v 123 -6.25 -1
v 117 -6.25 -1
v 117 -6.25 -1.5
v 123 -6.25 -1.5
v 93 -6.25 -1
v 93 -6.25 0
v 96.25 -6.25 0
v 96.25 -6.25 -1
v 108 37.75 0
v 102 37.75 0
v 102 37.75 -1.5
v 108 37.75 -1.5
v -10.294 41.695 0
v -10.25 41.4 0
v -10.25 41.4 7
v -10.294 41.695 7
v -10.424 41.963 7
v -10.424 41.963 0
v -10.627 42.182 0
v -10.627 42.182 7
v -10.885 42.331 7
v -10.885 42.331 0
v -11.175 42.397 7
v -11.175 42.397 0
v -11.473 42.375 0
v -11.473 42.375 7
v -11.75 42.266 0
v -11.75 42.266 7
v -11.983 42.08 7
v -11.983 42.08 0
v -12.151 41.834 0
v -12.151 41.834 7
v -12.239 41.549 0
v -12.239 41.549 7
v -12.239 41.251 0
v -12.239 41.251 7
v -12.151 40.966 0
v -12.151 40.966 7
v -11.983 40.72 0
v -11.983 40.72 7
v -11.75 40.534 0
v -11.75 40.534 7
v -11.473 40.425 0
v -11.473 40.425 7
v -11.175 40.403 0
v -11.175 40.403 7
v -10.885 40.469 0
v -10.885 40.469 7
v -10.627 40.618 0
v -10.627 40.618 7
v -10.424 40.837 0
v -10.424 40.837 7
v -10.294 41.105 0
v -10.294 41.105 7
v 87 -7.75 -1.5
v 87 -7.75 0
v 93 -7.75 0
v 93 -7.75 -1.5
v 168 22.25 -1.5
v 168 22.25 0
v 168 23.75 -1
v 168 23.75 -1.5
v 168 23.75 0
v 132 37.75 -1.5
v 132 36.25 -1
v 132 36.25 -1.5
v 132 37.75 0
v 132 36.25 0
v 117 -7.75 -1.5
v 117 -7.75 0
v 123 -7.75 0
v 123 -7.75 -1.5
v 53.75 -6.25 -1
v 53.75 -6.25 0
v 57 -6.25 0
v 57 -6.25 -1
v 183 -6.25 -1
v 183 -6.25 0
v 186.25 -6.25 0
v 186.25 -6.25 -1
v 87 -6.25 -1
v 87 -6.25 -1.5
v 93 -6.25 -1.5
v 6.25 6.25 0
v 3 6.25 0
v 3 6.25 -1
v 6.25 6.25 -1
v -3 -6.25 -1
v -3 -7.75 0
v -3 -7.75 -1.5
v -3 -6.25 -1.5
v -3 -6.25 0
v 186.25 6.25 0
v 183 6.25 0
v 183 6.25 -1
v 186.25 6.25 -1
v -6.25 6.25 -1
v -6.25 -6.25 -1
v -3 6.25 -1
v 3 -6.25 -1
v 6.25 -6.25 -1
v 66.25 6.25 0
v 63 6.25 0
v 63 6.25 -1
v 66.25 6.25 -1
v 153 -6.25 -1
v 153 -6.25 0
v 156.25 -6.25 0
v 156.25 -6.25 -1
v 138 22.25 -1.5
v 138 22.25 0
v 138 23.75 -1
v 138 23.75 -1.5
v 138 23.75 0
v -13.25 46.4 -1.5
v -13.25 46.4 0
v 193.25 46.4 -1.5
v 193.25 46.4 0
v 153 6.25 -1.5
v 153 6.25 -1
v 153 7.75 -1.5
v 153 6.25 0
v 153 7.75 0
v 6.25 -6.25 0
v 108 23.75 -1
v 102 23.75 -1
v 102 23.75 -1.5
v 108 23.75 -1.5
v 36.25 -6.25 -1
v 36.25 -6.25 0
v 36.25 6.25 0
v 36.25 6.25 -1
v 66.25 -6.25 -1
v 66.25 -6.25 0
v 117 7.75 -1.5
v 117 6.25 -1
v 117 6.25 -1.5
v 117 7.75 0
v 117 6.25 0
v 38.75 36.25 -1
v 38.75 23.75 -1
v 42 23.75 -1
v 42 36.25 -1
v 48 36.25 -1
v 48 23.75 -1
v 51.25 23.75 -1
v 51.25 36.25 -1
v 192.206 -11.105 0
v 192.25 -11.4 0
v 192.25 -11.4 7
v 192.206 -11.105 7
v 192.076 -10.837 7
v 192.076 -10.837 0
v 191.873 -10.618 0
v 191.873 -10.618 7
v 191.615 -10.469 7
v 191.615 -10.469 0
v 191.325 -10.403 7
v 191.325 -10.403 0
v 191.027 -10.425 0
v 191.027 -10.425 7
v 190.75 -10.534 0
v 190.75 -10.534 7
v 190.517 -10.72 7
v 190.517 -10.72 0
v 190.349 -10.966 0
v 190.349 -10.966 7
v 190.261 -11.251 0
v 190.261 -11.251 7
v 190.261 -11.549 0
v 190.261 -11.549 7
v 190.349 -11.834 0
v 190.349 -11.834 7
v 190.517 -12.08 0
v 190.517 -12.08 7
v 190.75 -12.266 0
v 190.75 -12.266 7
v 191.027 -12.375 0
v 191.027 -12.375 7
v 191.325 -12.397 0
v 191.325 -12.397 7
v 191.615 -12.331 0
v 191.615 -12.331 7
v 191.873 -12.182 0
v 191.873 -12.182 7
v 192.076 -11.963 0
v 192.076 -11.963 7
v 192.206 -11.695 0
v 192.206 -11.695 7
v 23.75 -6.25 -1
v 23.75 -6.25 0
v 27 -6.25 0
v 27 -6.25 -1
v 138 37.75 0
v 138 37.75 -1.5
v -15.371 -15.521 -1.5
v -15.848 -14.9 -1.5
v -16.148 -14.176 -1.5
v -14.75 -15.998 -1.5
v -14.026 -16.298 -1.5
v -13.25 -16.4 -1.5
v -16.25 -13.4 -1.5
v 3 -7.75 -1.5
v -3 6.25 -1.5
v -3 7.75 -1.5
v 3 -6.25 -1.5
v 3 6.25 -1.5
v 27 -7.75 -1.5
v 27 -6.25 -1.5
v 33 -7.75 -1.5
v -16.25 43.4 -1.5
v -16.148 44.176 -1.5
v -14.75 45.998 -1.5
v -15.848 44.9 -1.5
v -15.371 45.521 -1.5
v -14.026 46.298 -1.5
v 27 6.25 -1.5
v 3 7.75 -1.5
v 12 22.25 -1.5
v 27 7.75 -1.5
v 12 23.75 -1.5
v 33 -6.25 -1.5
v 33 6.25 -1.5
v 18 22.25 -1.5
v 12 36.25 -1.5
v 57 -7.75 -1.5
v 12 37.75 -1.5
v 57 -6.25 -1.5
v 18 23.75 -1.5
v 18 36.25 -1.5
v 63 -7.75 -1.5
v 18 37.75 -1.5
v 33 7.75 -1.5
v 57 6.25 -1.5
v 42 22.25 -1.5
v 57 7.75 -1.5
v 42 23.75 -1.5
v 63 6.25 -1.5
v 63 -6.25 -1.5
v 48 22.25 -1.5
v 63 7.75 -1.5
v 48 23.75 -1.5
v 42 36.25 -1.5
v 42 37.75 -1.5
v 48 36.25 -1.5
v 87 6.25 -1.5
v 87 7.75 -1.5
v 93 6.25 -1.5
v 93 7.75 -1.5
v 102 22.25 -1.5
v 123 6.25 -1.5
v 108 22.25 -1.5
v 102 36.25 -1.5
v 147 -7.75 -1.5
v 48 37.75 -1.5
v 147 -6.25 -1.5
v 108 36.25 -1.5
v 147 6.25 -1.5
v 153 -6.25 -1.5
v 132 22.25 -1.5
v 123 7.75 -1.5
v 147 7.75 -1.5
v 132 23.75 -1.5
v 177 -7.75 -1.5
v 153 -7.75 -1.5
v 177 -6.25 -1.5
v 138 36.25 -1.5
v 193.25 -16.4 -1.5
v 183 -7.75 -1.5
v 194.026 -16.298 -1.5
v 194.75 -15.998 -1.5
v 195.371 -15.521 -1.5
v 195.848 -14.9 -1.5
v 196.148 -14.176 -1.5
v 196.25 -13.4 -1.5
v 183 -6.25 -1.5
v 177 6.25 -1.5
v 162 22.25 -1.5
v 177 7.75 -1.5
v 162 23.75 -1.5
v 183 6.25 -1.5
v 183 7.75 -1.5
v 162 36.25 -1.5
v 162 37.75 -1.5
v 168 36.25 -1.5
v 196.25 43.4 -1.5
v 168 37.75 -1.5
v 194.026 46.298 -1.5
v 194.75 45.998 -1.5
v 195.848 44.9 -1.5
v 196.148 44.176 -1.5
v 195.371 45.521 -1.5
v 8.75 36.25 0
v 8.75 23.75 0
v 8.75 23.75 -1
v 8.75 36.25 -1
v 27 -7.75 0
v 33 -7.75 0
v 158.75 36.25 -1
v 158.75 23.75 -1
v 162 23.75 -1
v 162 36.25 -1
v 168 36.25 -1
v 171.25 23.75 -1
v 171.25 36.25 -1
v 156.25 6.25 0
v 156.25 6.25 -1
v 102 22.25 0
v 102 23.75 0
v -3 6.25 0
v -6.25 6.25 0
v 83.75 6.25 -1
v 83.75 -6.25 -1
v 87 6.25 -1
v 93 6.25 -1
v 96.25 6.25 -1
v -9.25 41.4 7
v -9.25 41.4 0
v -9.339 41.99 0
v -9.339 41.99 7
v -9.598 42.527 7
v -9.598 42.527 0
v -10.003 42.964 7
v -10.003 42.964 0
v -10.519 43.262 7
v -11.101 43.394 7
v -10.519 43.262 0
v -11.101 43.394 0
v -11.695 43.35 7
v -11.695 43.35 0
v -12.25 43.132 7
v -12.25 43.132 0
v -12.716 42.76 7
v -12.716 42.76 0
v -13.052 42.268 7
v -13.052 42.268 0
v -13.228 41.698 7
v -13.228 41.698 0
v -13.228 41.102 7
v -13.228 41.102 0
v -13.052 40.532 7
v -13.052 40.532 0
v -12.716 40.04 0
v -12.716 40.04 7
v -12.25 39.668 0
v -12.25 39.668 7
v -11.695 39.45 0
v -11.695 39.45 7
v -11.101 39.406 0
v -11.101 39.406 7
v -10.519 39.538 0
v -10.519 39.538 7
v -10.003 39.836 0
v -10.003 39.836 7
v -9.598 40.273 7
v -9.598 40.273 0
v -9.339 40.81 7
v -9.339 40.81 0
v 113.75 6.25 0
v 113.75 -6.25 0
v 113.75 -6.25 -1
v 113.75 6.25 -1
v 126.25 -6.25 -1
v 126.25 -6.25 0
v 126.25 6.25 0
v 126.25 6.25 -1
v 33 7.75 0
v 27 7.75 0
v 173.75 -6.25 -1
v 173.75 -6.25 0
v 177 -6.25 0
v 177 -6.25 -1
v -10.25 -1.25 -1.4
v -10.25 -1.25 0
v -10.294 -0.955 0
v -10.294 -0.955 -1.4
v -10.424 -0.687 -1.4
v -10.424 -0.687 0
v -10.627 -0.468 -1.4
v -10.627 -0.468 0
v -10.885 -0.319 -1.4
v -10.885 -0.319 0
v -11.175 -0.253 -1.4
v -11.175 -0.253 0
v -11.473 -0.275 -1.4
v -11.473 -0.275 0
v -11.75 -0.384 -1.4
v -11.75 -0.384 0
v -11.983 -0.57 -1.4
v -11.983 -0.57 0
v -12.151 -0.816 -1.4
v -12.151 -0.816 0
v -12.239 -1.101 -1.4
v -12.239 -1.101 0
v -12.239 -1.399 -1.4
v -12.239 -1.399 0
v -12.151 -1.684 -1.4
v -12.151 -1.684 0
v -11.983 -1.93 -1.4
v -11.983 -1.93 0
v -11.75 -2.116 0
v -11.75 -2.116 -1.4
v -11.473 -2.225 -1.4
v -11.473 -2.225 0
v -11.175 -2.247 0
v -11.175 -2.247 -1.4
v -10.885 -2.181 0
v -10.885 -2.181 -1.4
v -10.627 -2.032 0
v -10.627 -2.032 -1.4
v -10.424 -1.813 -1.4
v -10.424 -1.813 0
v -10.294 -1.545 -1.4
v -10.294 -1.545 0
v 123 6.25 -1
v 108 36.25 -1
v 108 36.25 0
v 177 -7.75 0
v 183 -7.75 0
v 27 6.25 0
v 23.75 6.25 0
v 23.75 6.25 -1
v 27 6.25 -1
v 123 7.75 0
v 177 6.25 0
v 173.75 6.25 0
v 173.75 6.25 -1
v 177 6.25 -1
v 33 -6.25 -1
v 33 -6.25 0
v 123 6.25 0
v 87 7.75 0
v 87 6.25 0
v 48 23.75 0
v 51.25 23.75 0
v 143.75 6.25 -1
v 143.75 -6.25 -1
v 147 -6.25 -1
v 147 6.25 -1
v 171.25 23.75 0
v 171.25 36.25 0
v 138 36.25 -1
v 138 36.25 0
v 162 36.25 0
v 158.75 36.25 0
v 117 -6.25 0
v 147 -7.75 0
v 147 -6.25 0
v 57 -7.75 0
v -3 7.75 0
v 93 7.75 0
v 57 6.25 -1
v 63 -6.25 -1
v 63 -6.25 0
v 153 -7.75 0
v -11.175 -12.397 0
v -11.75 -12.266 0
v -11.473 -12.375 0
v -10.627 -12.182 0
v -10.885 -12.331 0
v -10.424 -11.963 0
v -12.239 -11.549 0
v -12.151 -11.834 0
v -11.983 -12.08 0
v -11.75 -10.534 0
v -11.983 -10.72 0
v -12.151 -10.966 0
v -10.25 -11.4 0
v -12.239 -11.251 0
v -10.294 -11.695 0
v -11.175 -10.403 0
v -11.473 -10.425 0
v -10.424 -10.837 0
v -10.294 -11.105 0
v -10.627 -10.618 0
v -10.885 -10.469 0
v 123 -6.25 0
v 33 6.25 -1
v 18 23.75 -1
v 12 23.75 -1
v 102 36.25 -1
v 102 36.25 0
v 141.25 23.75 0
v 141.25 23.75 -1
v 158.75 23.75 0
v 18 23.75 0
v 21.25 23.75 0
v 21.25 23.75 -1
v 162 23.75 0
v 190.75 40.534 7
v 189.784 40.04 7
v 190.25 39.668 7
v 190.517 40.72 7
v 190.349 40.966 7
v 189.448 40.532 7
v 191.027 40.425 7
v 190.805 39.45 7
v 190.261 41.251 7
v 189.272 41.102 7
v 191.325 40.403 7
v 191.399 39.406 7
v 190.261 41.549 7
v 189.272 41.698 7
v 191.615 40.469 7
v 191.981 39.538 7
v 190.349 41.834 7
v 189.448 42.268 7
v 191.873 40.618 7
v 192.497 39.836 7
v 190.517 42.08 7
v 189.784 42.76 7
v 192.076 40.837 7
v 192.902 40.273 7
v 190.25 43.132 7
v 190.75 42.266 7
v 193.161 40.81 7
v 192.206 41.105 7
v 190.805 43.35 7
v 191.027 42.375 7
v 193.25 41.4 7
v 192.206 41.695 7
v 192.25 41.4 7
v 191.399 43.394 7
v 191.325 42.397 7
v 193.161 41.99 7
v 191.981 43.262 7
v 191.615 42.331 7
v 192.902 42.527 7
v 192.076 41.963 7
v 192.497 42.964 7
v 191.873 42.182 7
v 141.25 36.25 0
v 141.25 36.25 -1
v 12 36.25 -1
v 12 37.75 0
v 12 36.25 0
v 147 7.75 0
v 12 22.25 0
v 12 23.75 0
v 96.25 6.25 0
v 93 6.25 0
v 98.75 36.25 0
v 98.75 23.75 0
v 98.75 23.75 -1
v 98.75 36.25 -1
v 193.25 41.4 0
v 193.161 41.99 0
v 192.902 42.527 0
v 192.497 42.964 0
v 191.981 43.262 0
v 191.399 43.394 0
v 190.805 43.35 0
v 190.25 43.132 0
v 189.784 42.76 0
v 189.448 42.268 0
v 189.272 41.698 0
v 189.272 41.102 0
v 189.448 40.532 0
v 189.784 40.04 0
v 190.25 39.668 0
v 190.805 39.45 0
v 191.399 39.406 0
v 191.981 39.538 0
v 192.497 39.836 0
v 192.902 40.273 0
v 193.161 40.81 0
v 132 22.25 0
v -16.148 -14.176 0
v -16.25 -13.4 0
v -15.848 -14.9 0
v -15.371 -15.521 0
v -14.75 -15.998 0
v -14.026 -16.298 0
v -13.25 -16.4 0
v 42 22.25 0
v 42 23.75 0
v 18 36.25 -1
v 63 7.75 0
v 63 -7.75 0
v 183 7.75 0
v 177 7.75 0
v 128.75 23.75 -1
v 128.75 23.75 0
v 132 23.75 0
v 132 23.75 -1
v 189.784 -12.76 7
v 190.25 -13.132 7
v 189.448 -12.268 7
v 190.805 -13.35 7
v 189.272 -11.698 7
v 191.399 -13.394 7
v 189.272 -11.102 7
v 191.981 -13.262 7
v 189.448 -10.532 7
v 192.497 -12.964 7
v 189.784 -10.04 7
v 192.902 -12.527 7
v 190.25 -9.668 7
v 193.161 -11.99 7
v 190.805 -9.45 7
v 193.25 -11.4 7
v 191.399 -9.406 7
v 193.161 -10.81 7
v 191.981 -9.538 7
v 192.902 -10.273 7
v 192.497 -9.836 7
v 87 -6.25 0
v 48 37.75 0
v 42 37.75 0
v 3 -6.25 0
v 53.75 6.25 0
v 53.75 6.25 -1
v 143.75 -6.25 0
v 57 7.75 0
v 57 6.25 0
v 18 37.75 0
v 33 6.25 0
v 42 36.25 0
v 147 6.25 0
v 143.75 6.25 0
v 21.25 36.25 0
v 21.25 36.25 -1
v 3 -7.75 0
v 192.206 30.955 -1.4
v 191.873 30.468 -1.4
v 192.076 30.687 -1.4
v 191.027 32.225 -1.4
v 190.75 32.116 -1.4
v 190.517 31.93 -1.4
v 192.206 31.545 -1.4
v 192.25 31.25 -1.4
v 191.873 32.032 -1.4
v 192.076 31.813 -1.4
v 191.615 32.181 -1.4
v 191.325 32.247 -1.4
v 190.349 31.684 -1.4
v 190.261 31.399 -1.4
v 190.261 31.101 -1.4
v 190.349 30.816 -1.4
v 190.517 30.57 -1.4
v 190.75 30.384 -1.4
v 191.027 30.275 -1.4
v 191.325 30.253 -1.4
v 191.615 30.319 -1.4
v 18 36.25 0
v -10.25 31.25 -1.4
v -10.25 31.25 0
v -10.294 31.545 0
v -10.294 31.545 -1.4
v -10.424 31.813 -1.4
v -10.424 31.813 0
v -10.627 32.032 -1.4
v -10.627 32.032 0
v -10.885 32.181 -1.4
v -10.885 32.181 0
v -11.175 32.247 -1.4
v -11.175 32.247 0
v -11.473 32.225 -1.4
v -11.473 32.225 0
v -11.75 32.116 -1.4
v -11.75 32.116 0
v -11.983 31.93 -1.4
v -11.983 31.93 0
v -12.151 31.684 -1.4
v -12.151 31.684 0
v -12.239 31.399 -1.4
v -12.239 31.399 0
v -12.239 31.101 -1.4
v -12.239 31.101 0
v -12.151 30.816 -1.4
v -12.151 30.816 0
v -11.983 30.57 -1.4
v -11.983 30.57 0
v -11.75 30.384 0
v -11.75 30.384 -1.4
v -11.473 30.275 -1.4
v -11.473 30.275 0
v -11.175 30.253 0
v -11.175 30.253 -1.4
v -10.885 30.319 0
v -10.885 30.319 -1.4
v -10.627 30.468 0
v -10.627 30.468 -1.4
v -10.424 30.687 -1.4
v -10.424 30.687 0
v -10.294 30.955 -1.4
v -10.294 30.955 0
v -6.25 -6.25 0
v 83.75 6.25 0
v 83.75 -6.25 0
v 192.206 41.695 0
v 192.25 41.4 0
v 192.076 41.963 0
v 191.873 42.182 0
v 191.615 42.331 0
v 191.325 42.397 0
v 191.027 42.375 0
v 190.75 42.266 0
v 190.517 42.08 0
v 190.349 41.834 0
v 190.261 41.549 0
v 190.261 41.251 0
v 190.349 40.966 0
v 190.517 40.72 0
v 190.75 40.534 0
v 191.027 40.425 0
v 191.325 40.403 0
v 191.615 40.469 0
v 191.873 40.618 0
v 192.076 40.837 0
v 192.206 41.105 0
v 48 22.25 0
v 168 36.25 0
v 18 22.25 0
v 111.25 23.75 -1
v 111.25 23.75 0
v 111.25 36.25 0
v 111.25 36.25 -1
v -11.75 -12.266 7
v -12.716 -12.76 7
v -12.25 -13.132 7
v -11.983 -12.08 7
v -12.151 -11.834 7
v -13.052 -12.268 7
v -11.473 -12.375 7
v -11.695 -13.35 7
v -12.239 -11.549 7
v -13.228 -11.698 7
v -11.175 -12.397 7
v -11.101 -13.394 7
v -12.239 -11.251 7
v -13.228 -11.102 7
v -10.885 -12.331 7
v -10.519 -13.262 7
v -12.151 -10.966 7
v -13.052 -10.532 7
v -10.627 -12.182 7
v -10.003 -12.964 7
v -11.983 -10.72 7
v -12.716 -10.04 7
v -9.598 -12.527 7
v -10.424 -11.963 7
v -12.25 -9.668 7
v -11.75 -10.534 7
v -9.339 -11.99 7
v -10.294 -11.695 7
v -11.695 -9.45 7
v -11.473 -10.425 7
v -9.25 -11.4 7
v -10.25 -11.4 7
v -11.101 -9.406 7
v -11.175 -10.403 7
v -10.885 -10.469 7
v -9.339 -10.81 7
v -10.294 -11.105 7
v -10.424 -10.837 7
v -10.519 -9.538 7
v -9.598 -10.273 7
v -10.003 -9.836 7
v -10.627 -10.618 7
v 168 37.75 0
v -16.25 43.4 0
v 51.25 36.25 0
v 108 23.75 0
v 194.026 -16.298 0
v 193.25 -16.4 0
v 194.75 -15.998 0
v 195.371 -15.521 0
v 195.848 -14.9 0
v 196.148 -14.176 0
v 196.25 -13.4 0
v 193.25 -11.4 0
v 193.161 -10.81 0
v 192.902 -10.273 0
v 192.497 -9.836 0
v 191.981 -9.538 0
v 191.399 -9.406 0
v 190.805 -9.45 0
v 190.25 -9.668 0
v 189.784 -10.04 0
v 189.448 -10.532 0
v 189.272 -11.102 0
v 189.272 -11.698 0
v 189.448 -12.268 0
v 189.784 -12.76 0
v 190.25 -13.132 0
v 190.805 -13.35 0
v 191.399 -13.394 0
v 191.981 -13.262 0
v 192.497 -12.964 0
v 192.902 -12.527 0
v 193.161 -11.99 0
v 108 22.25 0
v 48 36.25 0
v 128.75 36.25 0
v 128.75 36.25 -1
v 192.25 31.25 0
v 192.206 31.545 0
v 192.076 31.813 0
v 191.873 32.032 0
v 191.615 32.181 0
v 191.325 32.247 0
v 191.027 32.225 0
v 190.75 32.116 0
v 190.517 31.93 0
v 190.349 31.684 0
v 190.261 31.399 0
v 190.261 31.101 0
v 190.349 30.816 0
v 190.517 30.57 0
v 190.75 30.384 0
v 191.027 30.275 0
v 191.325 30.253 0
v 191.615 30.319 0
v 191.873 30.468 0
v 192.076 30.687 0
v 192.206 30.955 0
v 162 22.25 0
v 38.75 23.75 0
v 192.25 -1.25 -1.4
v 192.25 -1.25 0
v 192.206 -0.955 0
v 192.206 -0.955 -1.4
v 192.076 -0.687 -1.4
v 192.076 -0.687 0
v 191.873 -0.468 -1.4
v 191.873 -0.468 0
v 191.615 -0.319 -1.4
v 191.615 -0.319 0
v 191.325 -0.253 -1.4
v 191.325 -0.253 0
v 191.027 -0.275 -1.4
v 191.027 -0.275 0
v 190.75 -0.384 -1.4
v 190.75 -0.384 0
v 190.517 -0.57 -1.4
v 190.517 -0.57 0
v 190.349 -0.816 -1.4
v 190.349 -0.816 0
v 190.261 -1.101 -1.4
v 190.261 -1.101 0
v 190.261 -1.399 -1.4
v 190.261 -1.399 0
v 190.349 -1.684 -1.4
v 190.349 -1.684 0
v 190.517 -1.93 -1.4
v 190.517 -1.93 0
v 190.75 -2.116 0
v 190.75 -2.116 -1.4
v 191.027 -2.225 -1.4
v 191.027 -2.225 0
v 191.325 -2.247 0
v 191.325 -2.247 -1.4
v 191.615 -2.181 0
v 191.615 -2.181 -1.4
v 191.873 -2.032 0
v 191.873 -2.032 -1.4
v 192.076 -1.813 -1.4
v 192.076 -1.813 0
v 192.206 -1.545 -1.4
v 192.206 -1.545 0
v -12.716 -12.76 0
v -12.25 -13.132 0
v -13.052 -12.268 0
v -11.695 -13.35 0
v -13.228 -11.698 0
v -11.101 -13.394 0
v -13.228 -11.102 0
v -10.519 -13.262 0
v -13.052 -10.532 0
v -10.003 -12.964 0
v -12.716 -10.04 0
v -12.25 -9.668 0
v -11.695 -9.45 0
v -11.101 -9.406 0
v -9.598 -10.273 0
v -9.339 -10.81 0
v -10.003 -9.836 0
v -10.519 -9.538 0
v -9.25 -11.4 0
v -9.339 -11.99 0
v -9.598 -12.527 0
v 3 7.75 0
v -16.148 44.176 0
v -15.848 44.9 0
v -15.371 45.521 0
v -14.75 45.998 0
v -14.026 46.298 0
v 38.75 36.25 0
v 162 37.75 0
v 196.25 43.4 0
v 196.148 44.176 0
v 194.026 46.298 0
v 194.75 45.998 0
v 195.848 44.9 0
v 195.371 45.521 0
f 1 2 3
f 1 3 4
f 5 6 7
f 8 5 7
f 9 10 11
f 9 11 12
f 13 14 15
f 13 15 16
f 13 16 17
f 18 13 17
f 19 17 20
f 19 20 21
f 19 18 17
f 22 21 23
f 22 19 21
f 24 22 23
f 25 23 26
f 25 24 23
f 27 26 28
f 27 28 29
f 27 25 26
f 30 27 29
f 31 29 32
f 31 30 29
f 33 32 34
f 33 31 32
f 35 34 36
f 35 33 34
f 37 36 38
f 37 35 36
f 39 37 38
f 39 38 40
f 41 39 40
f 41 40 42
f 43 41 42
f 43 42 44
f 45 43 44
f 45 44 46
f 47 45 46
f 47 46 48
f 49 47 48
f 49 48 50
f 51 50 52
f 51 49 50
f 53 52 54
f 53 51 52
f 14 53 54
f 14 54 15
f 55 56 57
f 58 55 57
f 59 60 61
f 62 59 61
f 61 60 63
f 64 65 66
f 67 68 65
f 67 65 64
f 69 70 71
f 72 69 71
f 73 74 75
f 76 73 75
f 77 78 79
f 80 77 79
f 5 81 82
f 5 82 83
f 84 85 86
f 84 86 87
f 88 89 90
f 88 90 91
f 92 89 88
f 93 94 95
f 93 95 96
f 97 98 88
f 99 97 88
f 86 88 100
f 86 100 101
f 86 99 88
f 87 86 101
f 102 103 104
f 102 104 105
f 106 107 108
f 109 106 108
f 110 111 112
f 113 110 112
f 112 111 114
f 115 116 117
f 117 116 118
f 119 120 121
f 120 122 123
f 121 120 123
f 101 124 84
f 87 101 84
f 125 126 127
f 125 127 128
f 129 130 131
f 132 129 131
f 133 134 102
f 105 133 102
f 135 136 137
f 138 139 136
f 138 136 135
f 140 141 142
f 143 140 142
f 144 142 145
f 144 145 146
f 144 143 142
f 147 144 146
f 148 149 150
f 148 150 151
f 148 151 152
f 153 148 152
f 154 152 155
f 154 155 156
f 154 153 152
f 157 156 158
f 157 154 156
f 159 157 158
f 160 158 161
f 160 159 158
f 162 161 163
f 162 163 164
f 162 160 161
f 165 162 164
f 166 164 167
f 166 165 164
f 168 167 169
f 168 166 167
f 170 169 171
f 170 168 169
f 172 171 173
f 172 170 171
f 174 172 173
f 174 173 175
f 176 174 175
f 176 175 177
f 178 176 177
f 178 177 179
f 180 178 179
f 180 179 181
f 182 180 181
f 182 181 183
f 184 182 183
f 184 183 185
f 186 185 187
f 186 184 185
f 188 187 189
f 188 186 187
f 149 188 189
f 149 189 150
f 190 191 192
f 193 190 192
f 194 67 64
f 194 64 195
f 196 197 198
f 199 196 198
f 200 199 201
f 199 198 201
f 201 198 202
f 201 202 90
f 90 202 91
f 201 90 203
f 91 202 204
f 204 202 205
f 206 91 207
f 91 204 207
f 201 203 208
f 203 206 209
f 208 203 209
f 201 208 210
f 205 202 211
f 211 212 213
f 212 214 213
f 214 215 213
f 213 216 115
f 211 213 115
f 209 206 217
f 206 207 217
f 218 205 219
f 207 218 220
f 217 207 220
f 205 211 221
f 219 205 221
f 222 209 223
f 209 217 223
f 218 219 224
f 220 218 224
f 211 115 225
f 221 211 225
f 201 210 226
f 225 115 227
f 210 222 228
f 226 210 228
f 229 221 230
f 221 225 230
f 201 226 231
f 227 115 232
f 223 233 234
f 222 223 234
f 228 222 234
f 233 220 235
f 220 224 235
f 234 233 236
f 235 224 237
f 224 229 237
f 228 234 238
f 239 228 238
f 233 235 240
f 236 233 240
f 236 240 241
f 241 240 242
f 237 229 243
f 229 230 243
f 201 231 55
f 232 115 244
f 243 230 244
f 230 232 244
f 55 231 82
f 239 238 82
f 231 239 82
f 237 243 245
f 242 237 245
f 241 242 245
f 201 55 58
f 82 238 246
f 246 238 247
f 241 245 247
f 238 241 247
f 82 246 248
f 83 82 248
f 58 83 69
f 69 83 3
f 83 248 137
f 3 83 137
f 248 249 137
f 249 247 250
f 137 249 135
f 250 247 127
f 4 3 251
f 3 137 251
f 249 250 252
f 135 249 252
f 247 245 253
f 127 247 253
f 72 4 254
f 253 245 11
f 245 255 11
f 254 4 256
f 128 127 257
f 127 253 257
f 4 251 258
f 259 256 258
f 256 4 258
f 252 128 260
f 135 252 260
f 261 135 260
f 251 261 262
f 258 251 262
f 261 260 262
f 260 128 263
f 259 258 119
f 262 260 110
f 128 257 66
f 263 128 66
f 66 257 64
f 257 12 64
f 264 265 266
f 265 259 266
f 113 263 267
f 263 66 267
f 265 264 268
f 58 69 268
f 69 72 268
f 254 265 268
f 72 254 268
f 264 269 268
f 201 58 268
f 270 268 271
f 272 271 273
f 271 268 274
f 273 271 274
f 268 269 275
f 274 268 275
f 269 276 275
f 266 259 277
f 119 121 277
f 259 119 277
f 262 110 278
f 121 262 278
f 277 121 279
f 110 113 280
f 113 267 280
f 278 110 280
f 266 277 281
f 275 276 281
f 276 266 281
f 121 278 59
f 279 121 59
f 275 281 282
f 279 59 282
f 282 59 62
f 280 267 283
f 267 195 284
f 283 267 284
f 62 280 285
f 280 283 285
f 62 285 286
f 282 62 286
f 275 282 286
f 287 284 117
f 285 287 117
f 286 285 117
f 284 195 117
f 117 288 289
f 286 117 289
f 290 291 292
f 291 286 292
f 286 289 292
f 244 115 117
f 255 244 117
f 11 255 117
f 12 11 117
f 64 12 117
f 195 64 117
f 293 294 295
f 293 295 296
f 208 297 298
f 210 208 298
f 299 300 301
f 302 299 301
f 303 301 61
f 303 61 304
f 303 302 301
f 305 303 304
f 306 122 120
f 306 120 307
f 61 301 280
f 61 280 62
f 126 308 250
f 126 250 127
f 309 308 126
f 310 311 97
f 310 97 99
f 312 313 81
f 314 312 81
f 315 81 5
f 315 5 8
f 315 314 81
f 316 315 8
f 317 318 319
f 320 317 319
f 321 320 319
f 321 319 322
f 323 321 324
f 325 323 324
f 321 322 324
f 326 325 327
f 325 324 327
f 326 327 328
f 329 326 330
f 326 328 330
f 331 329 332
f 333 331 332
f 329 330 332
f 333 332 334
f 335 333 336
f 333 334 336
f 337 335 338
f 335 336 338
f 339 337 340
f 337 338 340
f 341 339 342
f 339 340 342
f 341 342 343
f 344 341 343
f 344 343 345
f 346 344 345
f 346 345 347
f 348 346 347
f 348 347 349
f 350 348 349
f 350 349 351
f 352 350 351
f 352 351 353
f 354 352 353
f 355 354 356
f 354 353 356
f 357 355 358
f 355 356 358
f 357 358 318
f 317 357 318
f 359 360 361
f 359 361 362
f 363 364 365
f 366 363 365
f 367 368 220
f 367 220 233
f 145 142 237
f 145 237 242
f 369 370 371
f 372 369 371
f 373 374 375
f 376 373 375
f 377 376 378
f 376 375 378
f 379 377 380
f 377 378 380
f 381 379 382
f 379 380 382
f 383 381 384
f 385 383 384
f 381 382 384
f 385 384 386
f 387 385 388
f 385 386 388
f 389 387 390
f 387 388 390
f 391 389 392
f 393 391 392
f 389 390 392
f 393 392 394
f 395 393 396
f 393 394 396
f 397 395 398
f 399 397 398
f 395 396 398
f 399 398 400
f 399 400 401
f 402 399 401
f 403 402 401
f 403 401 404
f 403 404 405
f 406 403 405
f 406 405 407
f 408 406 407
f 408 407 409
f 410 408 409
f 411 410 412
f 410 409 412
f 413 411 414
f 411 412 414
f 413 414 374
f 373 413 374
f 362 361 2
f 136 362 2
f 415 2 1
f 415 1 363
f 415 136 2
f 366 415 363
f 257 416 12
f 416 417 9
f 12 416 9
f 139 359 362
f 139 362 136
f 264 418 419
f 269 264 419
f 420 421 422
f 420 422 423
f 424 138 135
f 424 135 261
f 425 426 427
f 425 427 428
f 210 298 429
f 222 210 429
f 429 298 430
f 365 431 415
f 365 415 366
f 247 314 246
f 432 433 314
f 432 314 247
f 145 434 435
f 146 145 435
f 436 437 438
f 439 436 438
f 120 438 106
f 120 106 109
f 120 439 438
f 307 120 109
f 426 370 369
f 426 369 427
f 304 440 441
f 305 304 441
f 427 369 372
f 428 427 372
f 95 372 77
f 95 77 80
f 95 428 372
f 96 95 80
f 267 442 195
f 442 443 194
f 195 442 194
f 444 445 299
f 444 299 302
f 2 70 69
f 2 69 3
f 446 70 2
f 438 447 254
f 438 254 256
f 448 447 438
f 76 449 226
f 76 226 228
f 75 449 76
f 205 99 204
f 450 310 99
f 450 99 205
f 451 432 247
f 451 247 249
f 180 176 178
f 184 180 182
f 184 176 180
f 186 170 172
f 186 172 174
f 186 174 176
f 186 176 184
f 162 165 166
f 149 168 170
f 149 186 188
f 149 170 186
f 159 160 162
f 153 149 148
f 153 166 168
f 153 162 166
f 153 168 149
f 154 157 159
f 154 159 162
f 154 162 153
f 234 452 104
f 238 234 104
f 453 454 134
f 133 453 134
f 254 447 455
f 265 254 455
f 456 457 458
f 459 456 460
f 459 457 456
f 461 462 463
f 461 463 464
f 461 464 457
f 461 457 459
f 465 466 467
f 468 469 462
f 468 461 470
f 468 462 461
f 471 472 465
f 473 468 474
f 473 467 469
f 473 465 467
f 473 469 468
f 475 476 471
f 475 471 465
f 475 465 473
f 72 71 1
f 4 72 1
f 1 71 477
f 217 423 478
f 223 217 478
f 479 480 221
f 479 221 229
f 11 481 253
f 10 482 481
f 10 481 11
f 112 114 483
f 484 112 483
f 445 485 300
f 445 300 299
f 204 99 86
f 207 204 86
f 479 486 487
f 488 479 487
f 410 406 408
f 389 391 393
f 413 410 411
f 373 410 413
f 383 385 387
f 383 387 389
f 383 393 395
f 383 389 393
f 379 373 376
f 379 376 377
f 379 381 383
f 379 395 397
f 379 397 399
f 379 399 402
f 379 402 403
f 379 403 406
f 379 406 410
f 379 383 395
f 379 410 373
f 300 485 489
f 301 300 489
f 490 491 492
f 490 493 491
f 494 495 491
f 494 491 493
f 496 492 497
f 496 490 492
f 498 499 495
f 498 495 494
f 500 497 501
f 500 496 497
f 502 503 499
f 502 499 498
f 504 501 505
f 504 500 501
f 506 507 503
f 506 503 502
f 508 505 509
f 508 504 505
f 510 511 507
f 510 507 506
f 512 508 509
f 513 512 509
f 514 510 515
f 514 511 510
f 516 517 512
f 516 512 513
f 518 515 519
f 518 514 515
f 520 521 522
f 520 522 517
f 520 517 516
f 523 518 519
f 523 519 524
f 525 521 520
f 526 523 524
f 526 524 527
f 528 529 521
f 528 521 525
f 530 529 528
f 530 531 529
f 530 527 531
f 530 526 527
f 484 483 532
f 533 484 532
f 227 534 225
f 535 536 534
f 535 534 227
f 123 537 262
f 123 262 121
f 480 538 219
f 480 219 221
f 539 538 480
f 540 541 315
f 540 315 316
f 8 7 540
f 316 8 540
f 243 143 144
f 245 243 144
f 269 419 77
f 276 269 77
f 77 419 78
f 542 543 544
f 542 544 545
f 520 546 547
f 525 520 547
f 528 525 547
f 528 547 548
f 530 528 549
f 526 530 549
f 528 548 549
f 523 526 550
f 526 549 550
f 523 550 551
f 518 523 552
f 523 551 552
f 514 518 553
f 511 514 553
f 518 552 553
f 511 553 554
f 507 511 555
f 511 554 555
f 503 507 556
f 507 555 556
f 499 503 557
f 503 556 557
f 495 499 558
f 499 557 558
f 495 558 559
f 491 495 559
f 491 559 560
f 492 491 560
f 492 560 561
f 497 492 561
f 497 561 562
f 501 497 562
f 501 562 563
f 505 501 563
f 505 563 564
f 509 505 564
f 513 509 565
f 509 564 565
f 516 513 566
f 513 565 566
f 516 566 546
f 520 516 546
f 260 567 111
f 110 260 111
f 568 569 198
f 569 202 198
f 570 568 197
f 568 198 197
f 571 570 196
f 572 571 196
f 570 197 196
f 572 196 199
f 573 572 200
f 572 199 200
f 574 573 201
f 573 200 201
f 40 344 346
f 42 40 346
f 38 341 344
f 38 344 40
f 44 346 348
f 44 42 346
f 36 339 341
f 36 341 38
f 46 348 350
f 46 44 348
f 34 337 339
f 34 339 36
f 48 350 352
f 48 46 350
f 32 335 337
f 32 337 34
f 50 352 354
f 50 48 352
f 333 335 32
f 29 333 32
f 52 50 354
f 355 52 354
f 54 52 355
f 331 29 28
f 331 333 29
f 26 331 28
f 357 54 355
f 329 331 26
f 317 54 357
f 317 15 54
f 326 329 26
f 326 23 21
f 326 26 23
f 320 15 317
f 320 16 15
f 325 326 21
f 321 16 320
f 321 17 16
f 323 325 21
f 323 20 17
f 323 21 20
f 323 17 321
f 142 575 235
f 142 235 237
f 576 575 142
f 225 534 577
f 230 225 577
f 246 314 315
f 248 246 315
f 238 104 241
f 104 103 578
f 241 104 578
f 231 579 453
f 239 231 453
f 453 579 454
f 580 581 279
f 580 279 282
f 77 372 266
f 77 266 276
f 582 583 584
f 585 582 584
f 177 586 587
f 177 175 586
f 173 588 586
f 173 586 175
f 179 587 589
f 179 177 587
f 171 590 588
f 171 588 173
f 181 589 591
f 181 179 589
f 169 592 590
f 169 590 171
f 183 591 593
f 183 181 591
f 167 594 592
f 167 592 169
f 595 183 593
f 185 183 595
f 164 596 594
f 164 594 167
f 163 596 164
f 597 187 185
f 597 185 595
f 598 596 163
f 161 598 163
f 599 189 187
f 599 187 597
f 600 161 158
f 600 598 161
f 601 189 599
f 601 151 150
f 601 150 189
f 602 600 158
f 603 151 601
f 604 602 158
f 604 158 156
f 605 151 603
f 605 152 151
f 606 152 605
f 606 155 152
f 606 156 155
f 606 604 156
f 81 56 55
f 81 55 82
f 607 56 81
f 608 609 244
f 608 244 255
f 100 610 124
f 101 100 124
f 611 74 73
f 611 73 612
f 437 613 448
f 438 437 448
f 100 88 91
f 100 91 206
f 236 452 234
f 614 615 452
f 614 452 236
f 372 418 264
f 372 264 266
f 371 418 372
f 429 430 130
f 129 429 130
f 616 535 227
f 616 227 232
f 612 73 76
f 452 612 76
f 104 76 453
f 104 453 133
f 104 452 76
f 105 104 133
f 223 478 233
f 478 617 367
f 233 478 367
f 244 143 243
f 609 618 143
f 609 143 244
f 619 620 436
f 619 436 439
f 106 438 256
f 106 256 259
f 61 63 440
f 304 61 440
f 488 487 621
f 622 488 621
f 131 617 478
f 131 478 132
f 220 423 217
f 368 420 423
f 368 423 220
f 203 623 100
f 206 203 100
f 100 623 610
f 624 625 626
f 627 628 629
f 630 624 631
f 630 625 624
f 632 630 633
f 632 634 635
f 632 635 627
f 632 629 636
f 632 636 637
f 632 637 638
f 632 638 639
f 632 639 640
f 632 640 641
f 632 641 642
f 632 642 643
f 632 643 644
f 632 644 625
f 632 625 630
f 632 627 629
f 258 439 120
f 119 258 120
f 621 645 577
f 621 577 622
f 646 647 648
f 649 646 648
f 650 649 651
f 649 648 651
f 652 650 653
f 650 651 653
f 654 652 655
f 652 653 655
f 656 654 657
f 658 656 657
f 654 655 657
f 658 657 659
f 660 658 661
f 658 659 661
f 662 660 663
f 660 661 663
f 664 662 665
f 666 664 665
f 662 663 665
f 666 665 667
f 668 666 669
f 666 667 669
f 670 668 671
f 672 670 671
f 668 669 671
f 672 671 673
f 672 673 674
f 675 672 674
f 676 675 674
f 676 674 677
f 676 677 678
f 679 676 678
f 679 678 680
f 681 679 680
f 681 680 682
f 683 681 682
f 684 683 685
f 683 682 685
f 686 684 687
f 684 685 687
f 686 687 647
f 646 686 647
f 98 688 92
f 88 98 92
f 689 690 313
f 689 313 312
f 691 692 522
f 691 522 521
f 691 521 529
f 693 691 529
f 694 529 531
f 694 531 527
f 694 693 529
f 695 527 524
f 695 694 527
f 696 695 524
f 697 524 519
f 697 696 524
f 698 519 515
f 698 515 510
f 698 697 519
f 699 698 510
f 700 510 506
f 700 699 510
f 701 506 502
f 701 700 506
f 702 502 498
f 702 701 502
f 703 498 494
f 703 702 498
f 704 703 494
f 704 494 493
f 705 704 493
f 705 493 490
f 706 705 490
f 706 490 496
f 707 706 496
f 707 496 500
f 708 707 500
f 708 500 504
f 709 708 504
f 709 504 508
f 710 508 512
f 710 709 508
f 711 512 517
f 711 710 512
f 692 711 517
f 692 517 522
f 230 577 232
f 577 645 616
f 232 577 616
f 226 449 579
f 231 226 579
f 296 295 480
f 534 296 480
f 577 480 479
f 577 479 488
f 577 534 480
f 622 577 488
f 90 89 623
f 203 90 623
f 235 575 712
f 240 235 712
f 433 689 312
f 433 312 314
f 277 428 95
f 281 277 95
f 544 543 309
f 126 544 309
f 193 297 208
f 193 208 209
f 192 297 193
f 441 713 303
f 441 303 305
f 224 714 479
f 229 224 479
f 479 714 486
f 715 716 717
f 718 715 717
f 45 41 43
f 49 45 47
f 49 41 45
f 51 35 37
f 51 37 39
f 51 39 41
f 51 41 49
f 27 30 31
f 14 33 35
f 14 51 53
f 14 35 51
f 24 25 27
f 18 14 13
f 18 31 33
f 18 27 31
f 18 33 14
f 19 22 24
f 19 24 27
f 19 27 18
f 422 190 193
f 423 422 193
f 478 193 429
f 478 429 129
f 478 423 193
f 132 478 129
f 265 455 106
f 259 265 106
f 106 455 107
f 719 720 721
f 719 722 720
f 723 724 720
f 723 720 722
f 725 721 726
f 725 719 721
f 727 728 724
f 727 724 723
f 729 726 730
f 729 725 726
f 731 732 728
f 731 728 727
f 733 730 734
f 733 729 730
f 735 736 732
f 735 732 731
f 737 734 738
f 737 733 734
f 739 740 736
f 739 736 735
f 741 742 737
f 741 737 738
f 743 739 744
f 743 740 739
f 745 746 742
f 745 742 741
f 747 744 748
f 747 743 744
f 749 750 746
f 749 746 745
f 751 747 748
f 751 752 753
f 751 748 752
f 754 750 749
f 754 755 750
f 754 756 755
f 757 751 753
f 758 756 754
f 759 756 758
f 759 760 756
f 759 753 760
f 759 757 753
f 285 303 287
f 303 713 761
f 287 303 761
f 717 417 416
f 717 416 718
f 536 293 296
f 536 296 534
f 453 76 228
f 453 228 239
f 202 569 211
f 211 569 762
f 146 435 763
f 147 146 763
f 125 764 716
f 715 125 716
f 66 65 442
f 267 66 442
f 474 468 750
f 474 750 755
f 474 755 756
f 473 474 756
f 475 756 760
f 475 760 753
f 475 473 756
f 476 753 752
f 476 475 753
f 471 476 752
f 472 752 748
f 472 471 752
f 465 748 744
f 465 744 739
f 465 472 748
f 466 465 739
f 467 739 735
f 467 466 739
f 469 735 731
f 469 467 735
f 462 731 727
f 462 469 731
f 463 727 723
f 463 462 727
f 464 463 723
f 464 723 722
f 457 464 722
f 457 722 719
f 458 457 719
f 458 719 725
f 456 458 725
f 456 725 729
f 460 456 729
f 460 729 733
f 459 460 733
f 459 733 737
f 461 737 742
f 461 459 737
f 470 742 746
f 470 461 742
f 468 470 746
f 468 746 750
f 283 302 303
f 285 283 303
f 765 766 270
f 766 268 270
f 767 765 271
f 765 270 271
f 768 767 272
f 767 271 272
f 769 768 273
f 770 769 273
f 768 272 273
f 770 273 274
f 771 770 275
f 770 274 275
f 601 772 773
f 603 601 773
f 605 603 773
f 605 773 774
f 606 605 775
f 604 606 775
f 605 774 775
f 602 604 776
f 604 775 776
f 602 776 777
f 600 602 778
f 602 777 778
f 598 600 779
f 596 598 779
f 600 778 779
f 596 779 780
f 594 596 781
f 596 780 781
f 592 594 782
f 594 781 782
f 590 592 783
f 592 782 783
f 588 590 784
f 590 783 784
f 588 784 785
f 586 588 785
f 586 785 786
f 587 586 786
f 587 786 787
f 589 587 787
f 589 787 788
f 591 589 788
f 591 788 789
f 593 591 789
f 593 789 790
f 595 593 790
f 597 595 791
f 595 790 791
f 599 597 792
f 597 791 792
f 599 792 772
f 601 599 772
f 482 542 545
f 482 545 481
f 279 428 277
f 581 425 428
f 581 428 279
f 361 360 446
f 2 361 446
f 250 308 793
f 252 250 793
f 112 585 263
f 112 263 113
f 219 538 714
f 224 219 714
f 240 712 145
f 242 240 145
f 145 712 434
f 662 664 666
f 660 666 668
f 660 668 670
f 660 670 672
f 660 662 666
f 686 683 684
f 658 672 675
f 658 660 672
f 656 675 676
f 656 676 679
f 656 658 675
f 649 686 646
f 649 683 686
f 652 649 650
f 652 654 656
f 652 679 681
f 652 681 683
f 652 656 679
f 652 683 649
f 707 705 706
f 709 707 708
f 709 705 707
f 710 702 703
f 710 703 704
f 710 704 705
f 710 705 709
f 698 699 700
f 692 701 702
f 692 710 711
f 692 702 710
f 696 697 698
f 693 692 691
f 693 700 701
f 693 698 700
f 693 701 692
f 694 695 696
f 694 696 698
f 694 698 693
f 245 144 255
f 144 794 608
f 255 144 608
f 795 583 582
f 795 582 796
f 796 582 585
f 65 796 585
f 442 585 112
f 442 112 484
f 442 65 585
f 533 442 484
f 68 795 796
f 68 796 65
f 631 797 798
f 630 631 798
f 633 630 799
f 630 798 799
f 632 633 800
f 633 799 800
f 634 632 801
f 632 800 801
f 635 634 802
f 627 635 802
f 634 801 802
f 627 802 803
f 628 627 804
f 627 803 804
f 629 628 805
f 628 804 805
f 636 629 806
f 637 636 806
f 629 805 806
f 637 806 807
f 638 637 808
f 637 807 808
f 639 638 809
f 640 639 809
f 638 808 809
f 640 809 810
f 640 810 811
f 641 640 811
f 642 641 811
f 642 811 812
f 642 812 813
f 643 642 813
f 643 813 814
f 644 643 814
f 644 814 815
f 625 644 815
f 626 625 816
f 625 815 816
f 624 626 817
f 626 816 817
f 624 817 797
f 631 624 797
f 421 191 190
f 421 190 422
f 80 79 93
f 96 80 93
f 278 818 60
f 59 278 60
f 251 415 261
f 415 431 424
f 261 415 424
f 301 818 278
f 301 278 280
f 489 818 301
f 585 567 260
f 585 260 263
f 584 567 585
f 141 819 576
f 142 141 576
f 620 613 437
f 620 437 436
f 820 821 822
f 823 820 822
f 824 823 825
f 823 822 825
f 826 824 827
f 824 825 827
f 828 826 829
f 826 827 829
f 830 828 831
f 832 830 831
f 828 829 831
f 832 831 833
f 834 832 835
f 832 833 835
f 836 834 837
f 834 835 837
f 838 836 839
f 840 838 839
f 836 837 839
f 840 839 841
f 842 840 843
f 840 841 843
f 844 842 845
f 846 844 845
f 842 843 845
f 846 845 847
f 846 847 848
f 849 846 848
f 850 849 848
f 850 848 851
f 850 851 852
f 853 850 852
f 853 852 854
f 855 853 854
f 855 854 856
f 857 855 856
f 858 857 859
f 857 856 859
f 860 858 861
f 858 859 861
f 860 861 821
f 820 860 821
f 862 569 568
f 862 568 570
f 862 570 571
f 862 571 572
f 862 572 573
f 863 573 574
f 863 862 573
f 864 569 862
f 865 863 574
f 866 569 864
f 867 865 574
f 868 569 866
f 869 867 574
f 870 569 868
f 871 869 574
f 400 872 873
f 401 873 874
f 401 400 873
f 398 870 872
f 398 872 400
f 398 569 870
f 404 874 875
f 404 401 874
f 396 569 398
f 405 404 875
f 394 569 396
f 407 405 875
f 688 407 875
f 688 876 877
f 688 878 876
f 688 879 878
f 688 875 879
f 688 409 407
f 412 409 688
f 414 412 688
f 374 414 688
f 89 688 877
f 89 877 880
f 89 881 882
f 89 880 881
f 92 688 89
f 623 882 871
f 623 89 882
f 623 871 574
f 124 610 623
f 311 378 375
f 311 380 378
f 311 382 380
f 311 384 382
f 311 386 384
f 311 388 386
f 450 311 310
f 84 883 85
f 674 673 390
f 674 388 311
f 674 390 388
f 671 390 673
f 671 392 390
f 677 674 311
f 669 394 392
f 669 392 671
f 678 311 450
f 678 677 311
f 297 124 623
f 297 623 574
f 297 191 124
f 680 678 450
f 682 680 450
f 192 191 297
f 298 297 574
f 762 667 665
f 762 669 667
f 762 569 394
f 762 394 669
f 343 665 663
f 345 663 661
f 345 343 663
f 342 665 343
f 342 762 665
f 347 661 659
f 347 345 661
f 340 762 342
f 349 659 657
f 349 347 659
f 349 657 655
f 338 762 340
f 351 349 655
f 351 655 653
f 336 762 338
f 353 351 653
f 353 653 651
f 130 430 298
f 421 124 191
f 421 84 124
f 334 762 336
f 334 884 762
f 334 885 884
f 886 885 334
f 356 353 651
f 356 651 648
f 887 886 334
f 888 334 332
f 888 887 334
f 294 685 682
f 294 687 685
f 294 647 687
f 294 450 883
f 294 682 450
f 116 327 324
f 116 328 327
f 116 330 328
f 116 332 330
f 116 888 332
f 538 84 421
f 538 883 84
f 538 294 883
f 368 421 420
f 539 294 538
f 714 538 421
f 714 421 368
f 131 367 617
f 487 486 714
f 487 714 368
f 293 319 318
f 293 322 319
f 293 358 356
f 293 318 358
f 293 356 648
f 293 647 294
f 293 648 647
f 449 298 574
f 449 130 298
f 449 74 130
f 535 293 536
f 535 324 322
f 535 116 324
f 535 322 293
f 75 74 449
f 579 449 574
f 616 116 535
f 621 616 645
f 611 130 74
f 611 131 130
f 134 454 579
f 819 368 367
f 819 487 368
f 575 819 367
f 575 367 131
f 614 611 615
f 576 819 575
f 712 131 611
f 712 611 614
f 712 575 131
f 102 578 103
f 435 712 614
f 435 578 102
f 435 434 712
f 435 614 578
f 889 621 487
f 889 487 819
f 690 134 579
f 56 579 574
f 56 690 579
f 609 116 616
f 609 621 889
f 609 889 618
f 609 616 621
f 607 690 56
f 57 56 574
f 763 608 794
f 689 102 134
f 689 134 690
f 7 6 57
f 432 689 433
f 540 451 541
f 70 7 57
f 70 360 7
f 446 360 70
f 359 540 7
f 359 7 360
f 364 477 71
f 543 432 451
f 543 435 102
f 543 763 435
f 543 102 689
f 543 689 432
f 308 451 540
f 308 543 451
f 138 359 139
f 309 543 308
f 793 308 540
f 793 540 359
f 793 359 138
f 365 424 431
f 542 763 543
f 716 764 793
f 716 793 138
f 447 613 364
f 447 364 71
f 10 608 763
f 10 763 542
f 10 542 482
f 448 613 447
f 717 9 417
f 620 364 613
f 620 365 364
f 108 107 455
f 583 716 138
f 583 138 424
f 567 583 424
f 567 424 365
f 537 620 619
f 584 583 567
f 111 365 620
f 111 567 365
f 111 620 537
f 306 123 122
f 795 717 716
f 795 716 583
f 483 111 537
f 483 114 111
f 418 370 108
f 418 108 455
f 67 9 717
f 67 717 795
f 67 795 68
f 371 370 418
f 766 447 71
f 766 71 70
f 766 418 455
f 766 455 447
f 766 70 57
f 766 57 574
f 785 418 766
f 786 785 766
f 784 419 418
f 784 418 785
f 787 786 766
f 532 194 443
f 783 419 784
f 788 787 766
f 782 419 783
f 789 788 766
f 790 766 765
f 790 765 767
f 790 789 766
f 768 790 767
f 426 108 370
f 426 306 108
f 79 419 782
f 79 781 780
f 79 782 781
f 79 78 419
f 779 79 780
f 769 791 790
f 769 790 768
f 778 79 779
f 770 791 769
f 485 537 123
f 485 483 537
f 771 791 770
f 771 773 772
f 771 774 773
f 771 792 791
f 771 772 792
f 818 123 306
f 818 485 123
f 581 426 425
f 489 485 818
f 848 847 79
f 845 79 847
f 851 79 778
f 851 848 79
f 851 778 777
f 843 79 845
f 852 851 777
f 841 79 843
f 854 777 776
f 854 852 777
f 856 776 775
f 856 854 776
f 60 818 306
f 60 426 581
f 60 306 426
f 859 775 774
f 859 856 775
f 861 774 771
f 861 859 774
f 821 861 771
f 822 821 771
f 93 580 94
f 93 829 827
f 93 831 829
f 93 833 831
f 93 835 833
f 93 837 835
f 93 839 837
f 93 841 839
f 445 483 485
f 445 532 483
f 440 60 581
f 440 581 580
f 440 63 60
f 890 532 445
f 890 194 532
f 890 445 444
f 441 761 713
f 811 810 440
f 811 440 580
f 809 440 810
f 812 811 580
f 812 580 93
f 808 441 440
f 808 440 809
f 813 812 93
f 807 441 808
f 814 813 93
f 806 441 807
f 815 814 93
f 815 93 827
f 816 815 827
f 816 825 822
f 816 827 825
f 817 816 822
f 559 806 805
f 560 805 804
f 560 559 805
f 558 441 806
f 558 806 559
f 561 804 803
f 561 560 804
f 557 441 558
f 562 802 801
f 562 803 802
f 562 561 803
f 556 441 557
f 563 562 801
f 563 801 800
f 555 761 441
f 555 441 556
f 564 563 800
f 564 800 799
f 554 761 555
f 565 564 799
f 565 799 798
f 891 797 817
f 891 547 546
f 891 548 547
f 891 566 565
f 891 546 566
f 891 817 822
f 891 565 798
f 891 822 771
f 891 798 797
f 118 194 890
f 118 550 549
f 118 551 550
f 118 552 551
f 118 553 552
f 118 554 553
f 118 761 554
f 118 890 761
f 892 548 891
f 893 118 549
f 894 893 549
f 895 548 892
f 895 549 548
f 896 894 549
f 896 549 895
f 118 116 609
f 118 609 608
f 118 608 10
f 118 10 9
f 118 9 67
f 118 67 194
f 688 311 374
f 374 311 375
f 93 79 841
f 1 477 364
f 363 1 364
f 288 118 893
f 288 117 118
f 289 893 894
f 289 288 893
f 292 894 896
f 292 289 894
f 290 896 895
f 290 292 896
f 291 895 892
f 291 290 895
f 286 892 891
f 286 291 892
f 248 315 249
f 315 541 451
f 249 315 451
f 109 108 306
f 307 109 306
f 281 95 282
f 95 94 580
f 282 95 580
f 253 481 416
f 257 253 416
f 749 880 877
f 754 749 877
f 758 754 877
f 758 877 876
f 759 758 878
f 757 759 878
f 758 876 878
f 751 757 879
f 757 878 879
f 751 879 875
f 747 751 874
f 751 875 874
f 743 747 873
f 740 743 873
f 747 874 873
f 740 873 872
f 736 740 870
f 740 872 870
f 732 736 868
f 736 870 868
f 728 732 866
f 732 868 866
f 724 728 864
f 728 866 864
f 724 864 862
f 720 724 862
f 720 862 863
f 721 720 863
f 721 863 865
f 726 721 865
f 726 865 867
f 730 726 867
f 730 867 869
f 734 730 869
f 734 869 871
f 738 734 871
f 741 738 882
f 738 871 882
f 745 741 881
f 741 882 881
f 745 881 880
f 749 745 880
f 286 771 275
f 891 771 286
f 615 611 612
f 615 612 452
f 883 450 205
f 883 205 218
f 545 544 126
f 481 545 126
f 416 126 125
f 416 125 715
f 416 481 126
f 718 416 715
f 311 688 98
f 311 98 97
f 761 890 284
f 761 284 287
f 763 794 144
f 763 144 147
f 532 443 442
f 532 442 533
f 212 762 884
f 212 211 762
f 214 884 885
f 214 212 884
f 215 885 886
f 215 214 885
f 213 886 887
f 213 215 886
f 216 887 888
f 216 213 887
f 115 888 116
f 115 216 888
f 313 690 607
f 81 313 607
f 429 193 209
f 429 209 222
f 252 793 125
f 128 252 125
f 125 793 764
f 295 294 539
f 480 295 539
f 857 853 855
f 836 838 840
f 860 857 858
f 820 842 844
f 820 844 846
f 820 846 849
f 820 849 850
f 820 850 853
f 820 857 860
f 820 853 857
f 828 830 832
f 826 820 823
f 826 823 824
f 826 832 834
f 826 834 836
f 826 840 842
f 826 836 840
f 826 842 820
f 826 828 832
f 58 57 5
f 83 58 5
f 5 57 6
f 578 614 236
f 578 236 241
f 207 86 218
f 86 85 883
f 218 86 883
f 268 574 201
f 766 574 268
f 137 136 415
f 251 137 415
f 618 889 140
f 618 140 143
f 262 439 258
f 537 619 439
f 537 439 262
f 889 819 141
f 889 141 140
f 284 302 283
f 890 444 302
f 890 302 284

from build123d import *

# Parameters (mm, degrees)
SKETCH001_W     = 212.5
SKETCH001_H     = 62.8
PAD_DEPTH       = 1.5
SKETCH_W        = 12.5
SKETCH_H        = 12.5
POCKET_DEPTH    = 1
SKETCH002_W     = 6
SKETCH002_H     = 1.5
POCKET001_DEPTH = 1.501
SKETCH003_R     = 2
SKETCH003_R_2   = 1
PAD001_DEPTH    = 7
SKETCH004_R     = 1
POCKET002_DEPTH = 1.4
FILLET_R        = 3


with BuildPart() as part:
    # Sketch001 → Pad (new body)
    with BuildSketch(Plane.XY):
        with Locations((90, 15)):
            Rectangle(SKETCH001_W, SKETCH001_H)
    extrude(amount=-PAD_DEPTH)

    # Sketch → Pocket (cut)
    with BuildSketch(Plane.XY):
        Rectangle(SKETCH_W, SKETCH_H)
        with Locations((30, 0)):
            Rectangle(SKETCH_W, SKETCH_H)
        with Locations((60, 0)):
            Rectangle(SKETCH_W, SKETCH_H)
        with Locations((90, 0)):
            Rectangle(SKETCH_W, SKETCH_H)
        with Locations((120, 0)):
            Rectangle(SKETCH_W, SKETCH_H)
        with Locations((150, 0)):
            Rectangle(SKETCH_W, SKETCH_H)
        with Locations((180, 0)):
            Rectangle(SKETCH_W, SKETCH_H)
        with Locations((15, 30)):
            Rectangle(SKETCH_W, SKETCH_H)
        with Locations((45, 30)):
            Rectangle(SKETCH_W, SKETCH_H)
        with Locations((105, 30)):
            Rectangle(SKETCH_W, SKETCH_H)
        with Locations((135, 30)):
            Rectangle(SKETCH_W, SKETCH_H)
        with Locations((165, 30)):
            Rectangle(SKETCH_W, SKETCH_H)
    extrude(amount=-POCKET_DEPTH, mode=Mode.SUBTRACT)

    # Sketch002 (on Face4 of Pocket) → Pocket001 (cut, through all)
    with BuildSketch(Plane.XY):
        with Locations((180, 7)):
            Rectangle(SKETCH002_W, SKETCH002_H)
        with Locations((180, -7)):
            Rectangle(SKETCH002_W, SKETCH002_H)
        with Locations((150, -7)):
            Rectangle(SKETCH002_W, SKETCH002_H)
        with Locations((150, 7)):
            Rectangle(SKETCH002_W, SKETCH002_H)
        with Locations((120, -7)):
            Rectangle(SKETCH002_W, SKETCH002_H)
        with Locations((120, 7)):
            Rectangle(SKETCH002_W, SKETCH002_H)
        with Locations((90, -7)):
            Rectangle(SKETCH002_W, SKETCH002_H)
        with Locations((90, 7)):
            Rectangle(SKETCH002_W, SKETCH002_H)
        with Locations((60, -7)):
            Rectangle(SKETCH002_W, SKETCH002_H)
        with Locations((60, 7)):
            Rectangle(SKETCH002_W, SKETCH002_H)
        with Locations((90, -7)):
            Rectangle(SKETCH002_W, SKETCH002_H)
        with Locations((90, 7)):
            Rectangle(SKETCH002_W, SKETCH002_H)
        with Locations((60, -7)):
            Rectangle(SKETCH002_W, SKETCH002_H)
        with Locations((60, 7)):
            Rectangle(SKETCH002_W, SKETCH002_H)
        with Locations((165, 37)):
            Rectangle(SKETCH002_W, SKETCH002_H)
        with Locations((165, 23)):
            Rectangle(SKETCH002_W, SKETCH002_H)
        with Locations((135, 37)):
            Rectangle(SKETCH002_W, SKETCH002_H)
        with Locations((135, 23)):
            Rectangle(SKETCH002_W, SKETCH002_H)
        with Locations((30, 7)):
            Rectangle(SKETCH002_W, SKETCH002_H)
        with Locations((30, -7)):
            Rectangle(SKETCH002_W, SKETCH002_H)
        with Locations((0, 7)):
            Rectangle(SKETCH002_W, SKETCH002_H)
        with Locations((0, -7)):
            Rectangle(SKETCH002_W, SKETCH002_H)
        with Locations((105, 37)):
            Rectangle(SKETCH002_W, SKETCH002_H)
        with Locations((105, 23)):
            Rectangle(SKETCH002_W, SKETCH002_H)
        with Locations((45, 37)):
            Rectangle(SKETCH002_W, SKETCH002_H)
        with Locations((45, 23)):
            Rectangle(SKETCH002_W, SKETCH002_H)
        with Locations((15, 23)):
            Rectangle(SKETCH002_W, SKETCH002_H)
        with Locations((15, 37)):
            Rectangle(SKETCH002_W, SKETCH002_H)
    extrude(amount=-POCKET001_DEPTH, mode=Mode.SUBTRACT)

    # Sketch003 (on Face4 of Pocket001) → Pad001 (join)
    with BuildSketch(Plane.XY):
        with Locations((-11.25, 41.4)):
            Circle(SKETCH003_R)
        with Locations((-11.25, 41.4)):
            Circle(SKETCH003_R_2, mode=Mode.SUBTRACT)
        with Locations((-11.25, -11.4)):
            Circle(SKETCH003_R)
        with Locations((-11.25, -11.4)):
            Circle(SKETCH003_R_2, mode=Mode.SUBTRACT)
        with Locations((191.25, -11.4)):
            Circle(SKETCH003_R)
        with Locations((191.25, -11.4)):
            Circle(SKETCH003_R_2, mode=Mode.SUBTRACT)
        with Locations((191.25, 41.4)):
            Circle(SKETCH003_R)
        with Locations((191.25, 41.4)):
            Circle(SKETCH003_R_2, mode=Mode.SUBTRACT)
    extrude(amount=PAD001_DEPTH)

    # Sketch004 (on Face4 of Pad001) → Pocket002 (cut)
    with BuildSketch(Plane.XY):
        with Locations((-11.25, -1.25)):
            Circle(SKETCH004_R)
        with Locations((-11.25, 31.25)):
            Circle(SKETCH004_R)
        with Locations((191.25, 31.25)):
            Circle(SKETCH004_R)
        with Locations((191.25, -1.25)):
            Circle(SKETCH004_R)
    extrude(amount=-POCKET002_DEPTH, mode=Mode.SUBTRACT)

    # Fillet
    fillet_edges = [part.edges().sort_by_distance(p)[0] for p in [
        (196.25, 46.4, -0.75),
        (196.25, -16.4, -0.75),
        (-16.25, -16.4, -0.75),
        (-16.25, 46.4, -0.75),
    ]]
    fillet(fillet_edges, radius=FILLET_R)


solid = part.part
